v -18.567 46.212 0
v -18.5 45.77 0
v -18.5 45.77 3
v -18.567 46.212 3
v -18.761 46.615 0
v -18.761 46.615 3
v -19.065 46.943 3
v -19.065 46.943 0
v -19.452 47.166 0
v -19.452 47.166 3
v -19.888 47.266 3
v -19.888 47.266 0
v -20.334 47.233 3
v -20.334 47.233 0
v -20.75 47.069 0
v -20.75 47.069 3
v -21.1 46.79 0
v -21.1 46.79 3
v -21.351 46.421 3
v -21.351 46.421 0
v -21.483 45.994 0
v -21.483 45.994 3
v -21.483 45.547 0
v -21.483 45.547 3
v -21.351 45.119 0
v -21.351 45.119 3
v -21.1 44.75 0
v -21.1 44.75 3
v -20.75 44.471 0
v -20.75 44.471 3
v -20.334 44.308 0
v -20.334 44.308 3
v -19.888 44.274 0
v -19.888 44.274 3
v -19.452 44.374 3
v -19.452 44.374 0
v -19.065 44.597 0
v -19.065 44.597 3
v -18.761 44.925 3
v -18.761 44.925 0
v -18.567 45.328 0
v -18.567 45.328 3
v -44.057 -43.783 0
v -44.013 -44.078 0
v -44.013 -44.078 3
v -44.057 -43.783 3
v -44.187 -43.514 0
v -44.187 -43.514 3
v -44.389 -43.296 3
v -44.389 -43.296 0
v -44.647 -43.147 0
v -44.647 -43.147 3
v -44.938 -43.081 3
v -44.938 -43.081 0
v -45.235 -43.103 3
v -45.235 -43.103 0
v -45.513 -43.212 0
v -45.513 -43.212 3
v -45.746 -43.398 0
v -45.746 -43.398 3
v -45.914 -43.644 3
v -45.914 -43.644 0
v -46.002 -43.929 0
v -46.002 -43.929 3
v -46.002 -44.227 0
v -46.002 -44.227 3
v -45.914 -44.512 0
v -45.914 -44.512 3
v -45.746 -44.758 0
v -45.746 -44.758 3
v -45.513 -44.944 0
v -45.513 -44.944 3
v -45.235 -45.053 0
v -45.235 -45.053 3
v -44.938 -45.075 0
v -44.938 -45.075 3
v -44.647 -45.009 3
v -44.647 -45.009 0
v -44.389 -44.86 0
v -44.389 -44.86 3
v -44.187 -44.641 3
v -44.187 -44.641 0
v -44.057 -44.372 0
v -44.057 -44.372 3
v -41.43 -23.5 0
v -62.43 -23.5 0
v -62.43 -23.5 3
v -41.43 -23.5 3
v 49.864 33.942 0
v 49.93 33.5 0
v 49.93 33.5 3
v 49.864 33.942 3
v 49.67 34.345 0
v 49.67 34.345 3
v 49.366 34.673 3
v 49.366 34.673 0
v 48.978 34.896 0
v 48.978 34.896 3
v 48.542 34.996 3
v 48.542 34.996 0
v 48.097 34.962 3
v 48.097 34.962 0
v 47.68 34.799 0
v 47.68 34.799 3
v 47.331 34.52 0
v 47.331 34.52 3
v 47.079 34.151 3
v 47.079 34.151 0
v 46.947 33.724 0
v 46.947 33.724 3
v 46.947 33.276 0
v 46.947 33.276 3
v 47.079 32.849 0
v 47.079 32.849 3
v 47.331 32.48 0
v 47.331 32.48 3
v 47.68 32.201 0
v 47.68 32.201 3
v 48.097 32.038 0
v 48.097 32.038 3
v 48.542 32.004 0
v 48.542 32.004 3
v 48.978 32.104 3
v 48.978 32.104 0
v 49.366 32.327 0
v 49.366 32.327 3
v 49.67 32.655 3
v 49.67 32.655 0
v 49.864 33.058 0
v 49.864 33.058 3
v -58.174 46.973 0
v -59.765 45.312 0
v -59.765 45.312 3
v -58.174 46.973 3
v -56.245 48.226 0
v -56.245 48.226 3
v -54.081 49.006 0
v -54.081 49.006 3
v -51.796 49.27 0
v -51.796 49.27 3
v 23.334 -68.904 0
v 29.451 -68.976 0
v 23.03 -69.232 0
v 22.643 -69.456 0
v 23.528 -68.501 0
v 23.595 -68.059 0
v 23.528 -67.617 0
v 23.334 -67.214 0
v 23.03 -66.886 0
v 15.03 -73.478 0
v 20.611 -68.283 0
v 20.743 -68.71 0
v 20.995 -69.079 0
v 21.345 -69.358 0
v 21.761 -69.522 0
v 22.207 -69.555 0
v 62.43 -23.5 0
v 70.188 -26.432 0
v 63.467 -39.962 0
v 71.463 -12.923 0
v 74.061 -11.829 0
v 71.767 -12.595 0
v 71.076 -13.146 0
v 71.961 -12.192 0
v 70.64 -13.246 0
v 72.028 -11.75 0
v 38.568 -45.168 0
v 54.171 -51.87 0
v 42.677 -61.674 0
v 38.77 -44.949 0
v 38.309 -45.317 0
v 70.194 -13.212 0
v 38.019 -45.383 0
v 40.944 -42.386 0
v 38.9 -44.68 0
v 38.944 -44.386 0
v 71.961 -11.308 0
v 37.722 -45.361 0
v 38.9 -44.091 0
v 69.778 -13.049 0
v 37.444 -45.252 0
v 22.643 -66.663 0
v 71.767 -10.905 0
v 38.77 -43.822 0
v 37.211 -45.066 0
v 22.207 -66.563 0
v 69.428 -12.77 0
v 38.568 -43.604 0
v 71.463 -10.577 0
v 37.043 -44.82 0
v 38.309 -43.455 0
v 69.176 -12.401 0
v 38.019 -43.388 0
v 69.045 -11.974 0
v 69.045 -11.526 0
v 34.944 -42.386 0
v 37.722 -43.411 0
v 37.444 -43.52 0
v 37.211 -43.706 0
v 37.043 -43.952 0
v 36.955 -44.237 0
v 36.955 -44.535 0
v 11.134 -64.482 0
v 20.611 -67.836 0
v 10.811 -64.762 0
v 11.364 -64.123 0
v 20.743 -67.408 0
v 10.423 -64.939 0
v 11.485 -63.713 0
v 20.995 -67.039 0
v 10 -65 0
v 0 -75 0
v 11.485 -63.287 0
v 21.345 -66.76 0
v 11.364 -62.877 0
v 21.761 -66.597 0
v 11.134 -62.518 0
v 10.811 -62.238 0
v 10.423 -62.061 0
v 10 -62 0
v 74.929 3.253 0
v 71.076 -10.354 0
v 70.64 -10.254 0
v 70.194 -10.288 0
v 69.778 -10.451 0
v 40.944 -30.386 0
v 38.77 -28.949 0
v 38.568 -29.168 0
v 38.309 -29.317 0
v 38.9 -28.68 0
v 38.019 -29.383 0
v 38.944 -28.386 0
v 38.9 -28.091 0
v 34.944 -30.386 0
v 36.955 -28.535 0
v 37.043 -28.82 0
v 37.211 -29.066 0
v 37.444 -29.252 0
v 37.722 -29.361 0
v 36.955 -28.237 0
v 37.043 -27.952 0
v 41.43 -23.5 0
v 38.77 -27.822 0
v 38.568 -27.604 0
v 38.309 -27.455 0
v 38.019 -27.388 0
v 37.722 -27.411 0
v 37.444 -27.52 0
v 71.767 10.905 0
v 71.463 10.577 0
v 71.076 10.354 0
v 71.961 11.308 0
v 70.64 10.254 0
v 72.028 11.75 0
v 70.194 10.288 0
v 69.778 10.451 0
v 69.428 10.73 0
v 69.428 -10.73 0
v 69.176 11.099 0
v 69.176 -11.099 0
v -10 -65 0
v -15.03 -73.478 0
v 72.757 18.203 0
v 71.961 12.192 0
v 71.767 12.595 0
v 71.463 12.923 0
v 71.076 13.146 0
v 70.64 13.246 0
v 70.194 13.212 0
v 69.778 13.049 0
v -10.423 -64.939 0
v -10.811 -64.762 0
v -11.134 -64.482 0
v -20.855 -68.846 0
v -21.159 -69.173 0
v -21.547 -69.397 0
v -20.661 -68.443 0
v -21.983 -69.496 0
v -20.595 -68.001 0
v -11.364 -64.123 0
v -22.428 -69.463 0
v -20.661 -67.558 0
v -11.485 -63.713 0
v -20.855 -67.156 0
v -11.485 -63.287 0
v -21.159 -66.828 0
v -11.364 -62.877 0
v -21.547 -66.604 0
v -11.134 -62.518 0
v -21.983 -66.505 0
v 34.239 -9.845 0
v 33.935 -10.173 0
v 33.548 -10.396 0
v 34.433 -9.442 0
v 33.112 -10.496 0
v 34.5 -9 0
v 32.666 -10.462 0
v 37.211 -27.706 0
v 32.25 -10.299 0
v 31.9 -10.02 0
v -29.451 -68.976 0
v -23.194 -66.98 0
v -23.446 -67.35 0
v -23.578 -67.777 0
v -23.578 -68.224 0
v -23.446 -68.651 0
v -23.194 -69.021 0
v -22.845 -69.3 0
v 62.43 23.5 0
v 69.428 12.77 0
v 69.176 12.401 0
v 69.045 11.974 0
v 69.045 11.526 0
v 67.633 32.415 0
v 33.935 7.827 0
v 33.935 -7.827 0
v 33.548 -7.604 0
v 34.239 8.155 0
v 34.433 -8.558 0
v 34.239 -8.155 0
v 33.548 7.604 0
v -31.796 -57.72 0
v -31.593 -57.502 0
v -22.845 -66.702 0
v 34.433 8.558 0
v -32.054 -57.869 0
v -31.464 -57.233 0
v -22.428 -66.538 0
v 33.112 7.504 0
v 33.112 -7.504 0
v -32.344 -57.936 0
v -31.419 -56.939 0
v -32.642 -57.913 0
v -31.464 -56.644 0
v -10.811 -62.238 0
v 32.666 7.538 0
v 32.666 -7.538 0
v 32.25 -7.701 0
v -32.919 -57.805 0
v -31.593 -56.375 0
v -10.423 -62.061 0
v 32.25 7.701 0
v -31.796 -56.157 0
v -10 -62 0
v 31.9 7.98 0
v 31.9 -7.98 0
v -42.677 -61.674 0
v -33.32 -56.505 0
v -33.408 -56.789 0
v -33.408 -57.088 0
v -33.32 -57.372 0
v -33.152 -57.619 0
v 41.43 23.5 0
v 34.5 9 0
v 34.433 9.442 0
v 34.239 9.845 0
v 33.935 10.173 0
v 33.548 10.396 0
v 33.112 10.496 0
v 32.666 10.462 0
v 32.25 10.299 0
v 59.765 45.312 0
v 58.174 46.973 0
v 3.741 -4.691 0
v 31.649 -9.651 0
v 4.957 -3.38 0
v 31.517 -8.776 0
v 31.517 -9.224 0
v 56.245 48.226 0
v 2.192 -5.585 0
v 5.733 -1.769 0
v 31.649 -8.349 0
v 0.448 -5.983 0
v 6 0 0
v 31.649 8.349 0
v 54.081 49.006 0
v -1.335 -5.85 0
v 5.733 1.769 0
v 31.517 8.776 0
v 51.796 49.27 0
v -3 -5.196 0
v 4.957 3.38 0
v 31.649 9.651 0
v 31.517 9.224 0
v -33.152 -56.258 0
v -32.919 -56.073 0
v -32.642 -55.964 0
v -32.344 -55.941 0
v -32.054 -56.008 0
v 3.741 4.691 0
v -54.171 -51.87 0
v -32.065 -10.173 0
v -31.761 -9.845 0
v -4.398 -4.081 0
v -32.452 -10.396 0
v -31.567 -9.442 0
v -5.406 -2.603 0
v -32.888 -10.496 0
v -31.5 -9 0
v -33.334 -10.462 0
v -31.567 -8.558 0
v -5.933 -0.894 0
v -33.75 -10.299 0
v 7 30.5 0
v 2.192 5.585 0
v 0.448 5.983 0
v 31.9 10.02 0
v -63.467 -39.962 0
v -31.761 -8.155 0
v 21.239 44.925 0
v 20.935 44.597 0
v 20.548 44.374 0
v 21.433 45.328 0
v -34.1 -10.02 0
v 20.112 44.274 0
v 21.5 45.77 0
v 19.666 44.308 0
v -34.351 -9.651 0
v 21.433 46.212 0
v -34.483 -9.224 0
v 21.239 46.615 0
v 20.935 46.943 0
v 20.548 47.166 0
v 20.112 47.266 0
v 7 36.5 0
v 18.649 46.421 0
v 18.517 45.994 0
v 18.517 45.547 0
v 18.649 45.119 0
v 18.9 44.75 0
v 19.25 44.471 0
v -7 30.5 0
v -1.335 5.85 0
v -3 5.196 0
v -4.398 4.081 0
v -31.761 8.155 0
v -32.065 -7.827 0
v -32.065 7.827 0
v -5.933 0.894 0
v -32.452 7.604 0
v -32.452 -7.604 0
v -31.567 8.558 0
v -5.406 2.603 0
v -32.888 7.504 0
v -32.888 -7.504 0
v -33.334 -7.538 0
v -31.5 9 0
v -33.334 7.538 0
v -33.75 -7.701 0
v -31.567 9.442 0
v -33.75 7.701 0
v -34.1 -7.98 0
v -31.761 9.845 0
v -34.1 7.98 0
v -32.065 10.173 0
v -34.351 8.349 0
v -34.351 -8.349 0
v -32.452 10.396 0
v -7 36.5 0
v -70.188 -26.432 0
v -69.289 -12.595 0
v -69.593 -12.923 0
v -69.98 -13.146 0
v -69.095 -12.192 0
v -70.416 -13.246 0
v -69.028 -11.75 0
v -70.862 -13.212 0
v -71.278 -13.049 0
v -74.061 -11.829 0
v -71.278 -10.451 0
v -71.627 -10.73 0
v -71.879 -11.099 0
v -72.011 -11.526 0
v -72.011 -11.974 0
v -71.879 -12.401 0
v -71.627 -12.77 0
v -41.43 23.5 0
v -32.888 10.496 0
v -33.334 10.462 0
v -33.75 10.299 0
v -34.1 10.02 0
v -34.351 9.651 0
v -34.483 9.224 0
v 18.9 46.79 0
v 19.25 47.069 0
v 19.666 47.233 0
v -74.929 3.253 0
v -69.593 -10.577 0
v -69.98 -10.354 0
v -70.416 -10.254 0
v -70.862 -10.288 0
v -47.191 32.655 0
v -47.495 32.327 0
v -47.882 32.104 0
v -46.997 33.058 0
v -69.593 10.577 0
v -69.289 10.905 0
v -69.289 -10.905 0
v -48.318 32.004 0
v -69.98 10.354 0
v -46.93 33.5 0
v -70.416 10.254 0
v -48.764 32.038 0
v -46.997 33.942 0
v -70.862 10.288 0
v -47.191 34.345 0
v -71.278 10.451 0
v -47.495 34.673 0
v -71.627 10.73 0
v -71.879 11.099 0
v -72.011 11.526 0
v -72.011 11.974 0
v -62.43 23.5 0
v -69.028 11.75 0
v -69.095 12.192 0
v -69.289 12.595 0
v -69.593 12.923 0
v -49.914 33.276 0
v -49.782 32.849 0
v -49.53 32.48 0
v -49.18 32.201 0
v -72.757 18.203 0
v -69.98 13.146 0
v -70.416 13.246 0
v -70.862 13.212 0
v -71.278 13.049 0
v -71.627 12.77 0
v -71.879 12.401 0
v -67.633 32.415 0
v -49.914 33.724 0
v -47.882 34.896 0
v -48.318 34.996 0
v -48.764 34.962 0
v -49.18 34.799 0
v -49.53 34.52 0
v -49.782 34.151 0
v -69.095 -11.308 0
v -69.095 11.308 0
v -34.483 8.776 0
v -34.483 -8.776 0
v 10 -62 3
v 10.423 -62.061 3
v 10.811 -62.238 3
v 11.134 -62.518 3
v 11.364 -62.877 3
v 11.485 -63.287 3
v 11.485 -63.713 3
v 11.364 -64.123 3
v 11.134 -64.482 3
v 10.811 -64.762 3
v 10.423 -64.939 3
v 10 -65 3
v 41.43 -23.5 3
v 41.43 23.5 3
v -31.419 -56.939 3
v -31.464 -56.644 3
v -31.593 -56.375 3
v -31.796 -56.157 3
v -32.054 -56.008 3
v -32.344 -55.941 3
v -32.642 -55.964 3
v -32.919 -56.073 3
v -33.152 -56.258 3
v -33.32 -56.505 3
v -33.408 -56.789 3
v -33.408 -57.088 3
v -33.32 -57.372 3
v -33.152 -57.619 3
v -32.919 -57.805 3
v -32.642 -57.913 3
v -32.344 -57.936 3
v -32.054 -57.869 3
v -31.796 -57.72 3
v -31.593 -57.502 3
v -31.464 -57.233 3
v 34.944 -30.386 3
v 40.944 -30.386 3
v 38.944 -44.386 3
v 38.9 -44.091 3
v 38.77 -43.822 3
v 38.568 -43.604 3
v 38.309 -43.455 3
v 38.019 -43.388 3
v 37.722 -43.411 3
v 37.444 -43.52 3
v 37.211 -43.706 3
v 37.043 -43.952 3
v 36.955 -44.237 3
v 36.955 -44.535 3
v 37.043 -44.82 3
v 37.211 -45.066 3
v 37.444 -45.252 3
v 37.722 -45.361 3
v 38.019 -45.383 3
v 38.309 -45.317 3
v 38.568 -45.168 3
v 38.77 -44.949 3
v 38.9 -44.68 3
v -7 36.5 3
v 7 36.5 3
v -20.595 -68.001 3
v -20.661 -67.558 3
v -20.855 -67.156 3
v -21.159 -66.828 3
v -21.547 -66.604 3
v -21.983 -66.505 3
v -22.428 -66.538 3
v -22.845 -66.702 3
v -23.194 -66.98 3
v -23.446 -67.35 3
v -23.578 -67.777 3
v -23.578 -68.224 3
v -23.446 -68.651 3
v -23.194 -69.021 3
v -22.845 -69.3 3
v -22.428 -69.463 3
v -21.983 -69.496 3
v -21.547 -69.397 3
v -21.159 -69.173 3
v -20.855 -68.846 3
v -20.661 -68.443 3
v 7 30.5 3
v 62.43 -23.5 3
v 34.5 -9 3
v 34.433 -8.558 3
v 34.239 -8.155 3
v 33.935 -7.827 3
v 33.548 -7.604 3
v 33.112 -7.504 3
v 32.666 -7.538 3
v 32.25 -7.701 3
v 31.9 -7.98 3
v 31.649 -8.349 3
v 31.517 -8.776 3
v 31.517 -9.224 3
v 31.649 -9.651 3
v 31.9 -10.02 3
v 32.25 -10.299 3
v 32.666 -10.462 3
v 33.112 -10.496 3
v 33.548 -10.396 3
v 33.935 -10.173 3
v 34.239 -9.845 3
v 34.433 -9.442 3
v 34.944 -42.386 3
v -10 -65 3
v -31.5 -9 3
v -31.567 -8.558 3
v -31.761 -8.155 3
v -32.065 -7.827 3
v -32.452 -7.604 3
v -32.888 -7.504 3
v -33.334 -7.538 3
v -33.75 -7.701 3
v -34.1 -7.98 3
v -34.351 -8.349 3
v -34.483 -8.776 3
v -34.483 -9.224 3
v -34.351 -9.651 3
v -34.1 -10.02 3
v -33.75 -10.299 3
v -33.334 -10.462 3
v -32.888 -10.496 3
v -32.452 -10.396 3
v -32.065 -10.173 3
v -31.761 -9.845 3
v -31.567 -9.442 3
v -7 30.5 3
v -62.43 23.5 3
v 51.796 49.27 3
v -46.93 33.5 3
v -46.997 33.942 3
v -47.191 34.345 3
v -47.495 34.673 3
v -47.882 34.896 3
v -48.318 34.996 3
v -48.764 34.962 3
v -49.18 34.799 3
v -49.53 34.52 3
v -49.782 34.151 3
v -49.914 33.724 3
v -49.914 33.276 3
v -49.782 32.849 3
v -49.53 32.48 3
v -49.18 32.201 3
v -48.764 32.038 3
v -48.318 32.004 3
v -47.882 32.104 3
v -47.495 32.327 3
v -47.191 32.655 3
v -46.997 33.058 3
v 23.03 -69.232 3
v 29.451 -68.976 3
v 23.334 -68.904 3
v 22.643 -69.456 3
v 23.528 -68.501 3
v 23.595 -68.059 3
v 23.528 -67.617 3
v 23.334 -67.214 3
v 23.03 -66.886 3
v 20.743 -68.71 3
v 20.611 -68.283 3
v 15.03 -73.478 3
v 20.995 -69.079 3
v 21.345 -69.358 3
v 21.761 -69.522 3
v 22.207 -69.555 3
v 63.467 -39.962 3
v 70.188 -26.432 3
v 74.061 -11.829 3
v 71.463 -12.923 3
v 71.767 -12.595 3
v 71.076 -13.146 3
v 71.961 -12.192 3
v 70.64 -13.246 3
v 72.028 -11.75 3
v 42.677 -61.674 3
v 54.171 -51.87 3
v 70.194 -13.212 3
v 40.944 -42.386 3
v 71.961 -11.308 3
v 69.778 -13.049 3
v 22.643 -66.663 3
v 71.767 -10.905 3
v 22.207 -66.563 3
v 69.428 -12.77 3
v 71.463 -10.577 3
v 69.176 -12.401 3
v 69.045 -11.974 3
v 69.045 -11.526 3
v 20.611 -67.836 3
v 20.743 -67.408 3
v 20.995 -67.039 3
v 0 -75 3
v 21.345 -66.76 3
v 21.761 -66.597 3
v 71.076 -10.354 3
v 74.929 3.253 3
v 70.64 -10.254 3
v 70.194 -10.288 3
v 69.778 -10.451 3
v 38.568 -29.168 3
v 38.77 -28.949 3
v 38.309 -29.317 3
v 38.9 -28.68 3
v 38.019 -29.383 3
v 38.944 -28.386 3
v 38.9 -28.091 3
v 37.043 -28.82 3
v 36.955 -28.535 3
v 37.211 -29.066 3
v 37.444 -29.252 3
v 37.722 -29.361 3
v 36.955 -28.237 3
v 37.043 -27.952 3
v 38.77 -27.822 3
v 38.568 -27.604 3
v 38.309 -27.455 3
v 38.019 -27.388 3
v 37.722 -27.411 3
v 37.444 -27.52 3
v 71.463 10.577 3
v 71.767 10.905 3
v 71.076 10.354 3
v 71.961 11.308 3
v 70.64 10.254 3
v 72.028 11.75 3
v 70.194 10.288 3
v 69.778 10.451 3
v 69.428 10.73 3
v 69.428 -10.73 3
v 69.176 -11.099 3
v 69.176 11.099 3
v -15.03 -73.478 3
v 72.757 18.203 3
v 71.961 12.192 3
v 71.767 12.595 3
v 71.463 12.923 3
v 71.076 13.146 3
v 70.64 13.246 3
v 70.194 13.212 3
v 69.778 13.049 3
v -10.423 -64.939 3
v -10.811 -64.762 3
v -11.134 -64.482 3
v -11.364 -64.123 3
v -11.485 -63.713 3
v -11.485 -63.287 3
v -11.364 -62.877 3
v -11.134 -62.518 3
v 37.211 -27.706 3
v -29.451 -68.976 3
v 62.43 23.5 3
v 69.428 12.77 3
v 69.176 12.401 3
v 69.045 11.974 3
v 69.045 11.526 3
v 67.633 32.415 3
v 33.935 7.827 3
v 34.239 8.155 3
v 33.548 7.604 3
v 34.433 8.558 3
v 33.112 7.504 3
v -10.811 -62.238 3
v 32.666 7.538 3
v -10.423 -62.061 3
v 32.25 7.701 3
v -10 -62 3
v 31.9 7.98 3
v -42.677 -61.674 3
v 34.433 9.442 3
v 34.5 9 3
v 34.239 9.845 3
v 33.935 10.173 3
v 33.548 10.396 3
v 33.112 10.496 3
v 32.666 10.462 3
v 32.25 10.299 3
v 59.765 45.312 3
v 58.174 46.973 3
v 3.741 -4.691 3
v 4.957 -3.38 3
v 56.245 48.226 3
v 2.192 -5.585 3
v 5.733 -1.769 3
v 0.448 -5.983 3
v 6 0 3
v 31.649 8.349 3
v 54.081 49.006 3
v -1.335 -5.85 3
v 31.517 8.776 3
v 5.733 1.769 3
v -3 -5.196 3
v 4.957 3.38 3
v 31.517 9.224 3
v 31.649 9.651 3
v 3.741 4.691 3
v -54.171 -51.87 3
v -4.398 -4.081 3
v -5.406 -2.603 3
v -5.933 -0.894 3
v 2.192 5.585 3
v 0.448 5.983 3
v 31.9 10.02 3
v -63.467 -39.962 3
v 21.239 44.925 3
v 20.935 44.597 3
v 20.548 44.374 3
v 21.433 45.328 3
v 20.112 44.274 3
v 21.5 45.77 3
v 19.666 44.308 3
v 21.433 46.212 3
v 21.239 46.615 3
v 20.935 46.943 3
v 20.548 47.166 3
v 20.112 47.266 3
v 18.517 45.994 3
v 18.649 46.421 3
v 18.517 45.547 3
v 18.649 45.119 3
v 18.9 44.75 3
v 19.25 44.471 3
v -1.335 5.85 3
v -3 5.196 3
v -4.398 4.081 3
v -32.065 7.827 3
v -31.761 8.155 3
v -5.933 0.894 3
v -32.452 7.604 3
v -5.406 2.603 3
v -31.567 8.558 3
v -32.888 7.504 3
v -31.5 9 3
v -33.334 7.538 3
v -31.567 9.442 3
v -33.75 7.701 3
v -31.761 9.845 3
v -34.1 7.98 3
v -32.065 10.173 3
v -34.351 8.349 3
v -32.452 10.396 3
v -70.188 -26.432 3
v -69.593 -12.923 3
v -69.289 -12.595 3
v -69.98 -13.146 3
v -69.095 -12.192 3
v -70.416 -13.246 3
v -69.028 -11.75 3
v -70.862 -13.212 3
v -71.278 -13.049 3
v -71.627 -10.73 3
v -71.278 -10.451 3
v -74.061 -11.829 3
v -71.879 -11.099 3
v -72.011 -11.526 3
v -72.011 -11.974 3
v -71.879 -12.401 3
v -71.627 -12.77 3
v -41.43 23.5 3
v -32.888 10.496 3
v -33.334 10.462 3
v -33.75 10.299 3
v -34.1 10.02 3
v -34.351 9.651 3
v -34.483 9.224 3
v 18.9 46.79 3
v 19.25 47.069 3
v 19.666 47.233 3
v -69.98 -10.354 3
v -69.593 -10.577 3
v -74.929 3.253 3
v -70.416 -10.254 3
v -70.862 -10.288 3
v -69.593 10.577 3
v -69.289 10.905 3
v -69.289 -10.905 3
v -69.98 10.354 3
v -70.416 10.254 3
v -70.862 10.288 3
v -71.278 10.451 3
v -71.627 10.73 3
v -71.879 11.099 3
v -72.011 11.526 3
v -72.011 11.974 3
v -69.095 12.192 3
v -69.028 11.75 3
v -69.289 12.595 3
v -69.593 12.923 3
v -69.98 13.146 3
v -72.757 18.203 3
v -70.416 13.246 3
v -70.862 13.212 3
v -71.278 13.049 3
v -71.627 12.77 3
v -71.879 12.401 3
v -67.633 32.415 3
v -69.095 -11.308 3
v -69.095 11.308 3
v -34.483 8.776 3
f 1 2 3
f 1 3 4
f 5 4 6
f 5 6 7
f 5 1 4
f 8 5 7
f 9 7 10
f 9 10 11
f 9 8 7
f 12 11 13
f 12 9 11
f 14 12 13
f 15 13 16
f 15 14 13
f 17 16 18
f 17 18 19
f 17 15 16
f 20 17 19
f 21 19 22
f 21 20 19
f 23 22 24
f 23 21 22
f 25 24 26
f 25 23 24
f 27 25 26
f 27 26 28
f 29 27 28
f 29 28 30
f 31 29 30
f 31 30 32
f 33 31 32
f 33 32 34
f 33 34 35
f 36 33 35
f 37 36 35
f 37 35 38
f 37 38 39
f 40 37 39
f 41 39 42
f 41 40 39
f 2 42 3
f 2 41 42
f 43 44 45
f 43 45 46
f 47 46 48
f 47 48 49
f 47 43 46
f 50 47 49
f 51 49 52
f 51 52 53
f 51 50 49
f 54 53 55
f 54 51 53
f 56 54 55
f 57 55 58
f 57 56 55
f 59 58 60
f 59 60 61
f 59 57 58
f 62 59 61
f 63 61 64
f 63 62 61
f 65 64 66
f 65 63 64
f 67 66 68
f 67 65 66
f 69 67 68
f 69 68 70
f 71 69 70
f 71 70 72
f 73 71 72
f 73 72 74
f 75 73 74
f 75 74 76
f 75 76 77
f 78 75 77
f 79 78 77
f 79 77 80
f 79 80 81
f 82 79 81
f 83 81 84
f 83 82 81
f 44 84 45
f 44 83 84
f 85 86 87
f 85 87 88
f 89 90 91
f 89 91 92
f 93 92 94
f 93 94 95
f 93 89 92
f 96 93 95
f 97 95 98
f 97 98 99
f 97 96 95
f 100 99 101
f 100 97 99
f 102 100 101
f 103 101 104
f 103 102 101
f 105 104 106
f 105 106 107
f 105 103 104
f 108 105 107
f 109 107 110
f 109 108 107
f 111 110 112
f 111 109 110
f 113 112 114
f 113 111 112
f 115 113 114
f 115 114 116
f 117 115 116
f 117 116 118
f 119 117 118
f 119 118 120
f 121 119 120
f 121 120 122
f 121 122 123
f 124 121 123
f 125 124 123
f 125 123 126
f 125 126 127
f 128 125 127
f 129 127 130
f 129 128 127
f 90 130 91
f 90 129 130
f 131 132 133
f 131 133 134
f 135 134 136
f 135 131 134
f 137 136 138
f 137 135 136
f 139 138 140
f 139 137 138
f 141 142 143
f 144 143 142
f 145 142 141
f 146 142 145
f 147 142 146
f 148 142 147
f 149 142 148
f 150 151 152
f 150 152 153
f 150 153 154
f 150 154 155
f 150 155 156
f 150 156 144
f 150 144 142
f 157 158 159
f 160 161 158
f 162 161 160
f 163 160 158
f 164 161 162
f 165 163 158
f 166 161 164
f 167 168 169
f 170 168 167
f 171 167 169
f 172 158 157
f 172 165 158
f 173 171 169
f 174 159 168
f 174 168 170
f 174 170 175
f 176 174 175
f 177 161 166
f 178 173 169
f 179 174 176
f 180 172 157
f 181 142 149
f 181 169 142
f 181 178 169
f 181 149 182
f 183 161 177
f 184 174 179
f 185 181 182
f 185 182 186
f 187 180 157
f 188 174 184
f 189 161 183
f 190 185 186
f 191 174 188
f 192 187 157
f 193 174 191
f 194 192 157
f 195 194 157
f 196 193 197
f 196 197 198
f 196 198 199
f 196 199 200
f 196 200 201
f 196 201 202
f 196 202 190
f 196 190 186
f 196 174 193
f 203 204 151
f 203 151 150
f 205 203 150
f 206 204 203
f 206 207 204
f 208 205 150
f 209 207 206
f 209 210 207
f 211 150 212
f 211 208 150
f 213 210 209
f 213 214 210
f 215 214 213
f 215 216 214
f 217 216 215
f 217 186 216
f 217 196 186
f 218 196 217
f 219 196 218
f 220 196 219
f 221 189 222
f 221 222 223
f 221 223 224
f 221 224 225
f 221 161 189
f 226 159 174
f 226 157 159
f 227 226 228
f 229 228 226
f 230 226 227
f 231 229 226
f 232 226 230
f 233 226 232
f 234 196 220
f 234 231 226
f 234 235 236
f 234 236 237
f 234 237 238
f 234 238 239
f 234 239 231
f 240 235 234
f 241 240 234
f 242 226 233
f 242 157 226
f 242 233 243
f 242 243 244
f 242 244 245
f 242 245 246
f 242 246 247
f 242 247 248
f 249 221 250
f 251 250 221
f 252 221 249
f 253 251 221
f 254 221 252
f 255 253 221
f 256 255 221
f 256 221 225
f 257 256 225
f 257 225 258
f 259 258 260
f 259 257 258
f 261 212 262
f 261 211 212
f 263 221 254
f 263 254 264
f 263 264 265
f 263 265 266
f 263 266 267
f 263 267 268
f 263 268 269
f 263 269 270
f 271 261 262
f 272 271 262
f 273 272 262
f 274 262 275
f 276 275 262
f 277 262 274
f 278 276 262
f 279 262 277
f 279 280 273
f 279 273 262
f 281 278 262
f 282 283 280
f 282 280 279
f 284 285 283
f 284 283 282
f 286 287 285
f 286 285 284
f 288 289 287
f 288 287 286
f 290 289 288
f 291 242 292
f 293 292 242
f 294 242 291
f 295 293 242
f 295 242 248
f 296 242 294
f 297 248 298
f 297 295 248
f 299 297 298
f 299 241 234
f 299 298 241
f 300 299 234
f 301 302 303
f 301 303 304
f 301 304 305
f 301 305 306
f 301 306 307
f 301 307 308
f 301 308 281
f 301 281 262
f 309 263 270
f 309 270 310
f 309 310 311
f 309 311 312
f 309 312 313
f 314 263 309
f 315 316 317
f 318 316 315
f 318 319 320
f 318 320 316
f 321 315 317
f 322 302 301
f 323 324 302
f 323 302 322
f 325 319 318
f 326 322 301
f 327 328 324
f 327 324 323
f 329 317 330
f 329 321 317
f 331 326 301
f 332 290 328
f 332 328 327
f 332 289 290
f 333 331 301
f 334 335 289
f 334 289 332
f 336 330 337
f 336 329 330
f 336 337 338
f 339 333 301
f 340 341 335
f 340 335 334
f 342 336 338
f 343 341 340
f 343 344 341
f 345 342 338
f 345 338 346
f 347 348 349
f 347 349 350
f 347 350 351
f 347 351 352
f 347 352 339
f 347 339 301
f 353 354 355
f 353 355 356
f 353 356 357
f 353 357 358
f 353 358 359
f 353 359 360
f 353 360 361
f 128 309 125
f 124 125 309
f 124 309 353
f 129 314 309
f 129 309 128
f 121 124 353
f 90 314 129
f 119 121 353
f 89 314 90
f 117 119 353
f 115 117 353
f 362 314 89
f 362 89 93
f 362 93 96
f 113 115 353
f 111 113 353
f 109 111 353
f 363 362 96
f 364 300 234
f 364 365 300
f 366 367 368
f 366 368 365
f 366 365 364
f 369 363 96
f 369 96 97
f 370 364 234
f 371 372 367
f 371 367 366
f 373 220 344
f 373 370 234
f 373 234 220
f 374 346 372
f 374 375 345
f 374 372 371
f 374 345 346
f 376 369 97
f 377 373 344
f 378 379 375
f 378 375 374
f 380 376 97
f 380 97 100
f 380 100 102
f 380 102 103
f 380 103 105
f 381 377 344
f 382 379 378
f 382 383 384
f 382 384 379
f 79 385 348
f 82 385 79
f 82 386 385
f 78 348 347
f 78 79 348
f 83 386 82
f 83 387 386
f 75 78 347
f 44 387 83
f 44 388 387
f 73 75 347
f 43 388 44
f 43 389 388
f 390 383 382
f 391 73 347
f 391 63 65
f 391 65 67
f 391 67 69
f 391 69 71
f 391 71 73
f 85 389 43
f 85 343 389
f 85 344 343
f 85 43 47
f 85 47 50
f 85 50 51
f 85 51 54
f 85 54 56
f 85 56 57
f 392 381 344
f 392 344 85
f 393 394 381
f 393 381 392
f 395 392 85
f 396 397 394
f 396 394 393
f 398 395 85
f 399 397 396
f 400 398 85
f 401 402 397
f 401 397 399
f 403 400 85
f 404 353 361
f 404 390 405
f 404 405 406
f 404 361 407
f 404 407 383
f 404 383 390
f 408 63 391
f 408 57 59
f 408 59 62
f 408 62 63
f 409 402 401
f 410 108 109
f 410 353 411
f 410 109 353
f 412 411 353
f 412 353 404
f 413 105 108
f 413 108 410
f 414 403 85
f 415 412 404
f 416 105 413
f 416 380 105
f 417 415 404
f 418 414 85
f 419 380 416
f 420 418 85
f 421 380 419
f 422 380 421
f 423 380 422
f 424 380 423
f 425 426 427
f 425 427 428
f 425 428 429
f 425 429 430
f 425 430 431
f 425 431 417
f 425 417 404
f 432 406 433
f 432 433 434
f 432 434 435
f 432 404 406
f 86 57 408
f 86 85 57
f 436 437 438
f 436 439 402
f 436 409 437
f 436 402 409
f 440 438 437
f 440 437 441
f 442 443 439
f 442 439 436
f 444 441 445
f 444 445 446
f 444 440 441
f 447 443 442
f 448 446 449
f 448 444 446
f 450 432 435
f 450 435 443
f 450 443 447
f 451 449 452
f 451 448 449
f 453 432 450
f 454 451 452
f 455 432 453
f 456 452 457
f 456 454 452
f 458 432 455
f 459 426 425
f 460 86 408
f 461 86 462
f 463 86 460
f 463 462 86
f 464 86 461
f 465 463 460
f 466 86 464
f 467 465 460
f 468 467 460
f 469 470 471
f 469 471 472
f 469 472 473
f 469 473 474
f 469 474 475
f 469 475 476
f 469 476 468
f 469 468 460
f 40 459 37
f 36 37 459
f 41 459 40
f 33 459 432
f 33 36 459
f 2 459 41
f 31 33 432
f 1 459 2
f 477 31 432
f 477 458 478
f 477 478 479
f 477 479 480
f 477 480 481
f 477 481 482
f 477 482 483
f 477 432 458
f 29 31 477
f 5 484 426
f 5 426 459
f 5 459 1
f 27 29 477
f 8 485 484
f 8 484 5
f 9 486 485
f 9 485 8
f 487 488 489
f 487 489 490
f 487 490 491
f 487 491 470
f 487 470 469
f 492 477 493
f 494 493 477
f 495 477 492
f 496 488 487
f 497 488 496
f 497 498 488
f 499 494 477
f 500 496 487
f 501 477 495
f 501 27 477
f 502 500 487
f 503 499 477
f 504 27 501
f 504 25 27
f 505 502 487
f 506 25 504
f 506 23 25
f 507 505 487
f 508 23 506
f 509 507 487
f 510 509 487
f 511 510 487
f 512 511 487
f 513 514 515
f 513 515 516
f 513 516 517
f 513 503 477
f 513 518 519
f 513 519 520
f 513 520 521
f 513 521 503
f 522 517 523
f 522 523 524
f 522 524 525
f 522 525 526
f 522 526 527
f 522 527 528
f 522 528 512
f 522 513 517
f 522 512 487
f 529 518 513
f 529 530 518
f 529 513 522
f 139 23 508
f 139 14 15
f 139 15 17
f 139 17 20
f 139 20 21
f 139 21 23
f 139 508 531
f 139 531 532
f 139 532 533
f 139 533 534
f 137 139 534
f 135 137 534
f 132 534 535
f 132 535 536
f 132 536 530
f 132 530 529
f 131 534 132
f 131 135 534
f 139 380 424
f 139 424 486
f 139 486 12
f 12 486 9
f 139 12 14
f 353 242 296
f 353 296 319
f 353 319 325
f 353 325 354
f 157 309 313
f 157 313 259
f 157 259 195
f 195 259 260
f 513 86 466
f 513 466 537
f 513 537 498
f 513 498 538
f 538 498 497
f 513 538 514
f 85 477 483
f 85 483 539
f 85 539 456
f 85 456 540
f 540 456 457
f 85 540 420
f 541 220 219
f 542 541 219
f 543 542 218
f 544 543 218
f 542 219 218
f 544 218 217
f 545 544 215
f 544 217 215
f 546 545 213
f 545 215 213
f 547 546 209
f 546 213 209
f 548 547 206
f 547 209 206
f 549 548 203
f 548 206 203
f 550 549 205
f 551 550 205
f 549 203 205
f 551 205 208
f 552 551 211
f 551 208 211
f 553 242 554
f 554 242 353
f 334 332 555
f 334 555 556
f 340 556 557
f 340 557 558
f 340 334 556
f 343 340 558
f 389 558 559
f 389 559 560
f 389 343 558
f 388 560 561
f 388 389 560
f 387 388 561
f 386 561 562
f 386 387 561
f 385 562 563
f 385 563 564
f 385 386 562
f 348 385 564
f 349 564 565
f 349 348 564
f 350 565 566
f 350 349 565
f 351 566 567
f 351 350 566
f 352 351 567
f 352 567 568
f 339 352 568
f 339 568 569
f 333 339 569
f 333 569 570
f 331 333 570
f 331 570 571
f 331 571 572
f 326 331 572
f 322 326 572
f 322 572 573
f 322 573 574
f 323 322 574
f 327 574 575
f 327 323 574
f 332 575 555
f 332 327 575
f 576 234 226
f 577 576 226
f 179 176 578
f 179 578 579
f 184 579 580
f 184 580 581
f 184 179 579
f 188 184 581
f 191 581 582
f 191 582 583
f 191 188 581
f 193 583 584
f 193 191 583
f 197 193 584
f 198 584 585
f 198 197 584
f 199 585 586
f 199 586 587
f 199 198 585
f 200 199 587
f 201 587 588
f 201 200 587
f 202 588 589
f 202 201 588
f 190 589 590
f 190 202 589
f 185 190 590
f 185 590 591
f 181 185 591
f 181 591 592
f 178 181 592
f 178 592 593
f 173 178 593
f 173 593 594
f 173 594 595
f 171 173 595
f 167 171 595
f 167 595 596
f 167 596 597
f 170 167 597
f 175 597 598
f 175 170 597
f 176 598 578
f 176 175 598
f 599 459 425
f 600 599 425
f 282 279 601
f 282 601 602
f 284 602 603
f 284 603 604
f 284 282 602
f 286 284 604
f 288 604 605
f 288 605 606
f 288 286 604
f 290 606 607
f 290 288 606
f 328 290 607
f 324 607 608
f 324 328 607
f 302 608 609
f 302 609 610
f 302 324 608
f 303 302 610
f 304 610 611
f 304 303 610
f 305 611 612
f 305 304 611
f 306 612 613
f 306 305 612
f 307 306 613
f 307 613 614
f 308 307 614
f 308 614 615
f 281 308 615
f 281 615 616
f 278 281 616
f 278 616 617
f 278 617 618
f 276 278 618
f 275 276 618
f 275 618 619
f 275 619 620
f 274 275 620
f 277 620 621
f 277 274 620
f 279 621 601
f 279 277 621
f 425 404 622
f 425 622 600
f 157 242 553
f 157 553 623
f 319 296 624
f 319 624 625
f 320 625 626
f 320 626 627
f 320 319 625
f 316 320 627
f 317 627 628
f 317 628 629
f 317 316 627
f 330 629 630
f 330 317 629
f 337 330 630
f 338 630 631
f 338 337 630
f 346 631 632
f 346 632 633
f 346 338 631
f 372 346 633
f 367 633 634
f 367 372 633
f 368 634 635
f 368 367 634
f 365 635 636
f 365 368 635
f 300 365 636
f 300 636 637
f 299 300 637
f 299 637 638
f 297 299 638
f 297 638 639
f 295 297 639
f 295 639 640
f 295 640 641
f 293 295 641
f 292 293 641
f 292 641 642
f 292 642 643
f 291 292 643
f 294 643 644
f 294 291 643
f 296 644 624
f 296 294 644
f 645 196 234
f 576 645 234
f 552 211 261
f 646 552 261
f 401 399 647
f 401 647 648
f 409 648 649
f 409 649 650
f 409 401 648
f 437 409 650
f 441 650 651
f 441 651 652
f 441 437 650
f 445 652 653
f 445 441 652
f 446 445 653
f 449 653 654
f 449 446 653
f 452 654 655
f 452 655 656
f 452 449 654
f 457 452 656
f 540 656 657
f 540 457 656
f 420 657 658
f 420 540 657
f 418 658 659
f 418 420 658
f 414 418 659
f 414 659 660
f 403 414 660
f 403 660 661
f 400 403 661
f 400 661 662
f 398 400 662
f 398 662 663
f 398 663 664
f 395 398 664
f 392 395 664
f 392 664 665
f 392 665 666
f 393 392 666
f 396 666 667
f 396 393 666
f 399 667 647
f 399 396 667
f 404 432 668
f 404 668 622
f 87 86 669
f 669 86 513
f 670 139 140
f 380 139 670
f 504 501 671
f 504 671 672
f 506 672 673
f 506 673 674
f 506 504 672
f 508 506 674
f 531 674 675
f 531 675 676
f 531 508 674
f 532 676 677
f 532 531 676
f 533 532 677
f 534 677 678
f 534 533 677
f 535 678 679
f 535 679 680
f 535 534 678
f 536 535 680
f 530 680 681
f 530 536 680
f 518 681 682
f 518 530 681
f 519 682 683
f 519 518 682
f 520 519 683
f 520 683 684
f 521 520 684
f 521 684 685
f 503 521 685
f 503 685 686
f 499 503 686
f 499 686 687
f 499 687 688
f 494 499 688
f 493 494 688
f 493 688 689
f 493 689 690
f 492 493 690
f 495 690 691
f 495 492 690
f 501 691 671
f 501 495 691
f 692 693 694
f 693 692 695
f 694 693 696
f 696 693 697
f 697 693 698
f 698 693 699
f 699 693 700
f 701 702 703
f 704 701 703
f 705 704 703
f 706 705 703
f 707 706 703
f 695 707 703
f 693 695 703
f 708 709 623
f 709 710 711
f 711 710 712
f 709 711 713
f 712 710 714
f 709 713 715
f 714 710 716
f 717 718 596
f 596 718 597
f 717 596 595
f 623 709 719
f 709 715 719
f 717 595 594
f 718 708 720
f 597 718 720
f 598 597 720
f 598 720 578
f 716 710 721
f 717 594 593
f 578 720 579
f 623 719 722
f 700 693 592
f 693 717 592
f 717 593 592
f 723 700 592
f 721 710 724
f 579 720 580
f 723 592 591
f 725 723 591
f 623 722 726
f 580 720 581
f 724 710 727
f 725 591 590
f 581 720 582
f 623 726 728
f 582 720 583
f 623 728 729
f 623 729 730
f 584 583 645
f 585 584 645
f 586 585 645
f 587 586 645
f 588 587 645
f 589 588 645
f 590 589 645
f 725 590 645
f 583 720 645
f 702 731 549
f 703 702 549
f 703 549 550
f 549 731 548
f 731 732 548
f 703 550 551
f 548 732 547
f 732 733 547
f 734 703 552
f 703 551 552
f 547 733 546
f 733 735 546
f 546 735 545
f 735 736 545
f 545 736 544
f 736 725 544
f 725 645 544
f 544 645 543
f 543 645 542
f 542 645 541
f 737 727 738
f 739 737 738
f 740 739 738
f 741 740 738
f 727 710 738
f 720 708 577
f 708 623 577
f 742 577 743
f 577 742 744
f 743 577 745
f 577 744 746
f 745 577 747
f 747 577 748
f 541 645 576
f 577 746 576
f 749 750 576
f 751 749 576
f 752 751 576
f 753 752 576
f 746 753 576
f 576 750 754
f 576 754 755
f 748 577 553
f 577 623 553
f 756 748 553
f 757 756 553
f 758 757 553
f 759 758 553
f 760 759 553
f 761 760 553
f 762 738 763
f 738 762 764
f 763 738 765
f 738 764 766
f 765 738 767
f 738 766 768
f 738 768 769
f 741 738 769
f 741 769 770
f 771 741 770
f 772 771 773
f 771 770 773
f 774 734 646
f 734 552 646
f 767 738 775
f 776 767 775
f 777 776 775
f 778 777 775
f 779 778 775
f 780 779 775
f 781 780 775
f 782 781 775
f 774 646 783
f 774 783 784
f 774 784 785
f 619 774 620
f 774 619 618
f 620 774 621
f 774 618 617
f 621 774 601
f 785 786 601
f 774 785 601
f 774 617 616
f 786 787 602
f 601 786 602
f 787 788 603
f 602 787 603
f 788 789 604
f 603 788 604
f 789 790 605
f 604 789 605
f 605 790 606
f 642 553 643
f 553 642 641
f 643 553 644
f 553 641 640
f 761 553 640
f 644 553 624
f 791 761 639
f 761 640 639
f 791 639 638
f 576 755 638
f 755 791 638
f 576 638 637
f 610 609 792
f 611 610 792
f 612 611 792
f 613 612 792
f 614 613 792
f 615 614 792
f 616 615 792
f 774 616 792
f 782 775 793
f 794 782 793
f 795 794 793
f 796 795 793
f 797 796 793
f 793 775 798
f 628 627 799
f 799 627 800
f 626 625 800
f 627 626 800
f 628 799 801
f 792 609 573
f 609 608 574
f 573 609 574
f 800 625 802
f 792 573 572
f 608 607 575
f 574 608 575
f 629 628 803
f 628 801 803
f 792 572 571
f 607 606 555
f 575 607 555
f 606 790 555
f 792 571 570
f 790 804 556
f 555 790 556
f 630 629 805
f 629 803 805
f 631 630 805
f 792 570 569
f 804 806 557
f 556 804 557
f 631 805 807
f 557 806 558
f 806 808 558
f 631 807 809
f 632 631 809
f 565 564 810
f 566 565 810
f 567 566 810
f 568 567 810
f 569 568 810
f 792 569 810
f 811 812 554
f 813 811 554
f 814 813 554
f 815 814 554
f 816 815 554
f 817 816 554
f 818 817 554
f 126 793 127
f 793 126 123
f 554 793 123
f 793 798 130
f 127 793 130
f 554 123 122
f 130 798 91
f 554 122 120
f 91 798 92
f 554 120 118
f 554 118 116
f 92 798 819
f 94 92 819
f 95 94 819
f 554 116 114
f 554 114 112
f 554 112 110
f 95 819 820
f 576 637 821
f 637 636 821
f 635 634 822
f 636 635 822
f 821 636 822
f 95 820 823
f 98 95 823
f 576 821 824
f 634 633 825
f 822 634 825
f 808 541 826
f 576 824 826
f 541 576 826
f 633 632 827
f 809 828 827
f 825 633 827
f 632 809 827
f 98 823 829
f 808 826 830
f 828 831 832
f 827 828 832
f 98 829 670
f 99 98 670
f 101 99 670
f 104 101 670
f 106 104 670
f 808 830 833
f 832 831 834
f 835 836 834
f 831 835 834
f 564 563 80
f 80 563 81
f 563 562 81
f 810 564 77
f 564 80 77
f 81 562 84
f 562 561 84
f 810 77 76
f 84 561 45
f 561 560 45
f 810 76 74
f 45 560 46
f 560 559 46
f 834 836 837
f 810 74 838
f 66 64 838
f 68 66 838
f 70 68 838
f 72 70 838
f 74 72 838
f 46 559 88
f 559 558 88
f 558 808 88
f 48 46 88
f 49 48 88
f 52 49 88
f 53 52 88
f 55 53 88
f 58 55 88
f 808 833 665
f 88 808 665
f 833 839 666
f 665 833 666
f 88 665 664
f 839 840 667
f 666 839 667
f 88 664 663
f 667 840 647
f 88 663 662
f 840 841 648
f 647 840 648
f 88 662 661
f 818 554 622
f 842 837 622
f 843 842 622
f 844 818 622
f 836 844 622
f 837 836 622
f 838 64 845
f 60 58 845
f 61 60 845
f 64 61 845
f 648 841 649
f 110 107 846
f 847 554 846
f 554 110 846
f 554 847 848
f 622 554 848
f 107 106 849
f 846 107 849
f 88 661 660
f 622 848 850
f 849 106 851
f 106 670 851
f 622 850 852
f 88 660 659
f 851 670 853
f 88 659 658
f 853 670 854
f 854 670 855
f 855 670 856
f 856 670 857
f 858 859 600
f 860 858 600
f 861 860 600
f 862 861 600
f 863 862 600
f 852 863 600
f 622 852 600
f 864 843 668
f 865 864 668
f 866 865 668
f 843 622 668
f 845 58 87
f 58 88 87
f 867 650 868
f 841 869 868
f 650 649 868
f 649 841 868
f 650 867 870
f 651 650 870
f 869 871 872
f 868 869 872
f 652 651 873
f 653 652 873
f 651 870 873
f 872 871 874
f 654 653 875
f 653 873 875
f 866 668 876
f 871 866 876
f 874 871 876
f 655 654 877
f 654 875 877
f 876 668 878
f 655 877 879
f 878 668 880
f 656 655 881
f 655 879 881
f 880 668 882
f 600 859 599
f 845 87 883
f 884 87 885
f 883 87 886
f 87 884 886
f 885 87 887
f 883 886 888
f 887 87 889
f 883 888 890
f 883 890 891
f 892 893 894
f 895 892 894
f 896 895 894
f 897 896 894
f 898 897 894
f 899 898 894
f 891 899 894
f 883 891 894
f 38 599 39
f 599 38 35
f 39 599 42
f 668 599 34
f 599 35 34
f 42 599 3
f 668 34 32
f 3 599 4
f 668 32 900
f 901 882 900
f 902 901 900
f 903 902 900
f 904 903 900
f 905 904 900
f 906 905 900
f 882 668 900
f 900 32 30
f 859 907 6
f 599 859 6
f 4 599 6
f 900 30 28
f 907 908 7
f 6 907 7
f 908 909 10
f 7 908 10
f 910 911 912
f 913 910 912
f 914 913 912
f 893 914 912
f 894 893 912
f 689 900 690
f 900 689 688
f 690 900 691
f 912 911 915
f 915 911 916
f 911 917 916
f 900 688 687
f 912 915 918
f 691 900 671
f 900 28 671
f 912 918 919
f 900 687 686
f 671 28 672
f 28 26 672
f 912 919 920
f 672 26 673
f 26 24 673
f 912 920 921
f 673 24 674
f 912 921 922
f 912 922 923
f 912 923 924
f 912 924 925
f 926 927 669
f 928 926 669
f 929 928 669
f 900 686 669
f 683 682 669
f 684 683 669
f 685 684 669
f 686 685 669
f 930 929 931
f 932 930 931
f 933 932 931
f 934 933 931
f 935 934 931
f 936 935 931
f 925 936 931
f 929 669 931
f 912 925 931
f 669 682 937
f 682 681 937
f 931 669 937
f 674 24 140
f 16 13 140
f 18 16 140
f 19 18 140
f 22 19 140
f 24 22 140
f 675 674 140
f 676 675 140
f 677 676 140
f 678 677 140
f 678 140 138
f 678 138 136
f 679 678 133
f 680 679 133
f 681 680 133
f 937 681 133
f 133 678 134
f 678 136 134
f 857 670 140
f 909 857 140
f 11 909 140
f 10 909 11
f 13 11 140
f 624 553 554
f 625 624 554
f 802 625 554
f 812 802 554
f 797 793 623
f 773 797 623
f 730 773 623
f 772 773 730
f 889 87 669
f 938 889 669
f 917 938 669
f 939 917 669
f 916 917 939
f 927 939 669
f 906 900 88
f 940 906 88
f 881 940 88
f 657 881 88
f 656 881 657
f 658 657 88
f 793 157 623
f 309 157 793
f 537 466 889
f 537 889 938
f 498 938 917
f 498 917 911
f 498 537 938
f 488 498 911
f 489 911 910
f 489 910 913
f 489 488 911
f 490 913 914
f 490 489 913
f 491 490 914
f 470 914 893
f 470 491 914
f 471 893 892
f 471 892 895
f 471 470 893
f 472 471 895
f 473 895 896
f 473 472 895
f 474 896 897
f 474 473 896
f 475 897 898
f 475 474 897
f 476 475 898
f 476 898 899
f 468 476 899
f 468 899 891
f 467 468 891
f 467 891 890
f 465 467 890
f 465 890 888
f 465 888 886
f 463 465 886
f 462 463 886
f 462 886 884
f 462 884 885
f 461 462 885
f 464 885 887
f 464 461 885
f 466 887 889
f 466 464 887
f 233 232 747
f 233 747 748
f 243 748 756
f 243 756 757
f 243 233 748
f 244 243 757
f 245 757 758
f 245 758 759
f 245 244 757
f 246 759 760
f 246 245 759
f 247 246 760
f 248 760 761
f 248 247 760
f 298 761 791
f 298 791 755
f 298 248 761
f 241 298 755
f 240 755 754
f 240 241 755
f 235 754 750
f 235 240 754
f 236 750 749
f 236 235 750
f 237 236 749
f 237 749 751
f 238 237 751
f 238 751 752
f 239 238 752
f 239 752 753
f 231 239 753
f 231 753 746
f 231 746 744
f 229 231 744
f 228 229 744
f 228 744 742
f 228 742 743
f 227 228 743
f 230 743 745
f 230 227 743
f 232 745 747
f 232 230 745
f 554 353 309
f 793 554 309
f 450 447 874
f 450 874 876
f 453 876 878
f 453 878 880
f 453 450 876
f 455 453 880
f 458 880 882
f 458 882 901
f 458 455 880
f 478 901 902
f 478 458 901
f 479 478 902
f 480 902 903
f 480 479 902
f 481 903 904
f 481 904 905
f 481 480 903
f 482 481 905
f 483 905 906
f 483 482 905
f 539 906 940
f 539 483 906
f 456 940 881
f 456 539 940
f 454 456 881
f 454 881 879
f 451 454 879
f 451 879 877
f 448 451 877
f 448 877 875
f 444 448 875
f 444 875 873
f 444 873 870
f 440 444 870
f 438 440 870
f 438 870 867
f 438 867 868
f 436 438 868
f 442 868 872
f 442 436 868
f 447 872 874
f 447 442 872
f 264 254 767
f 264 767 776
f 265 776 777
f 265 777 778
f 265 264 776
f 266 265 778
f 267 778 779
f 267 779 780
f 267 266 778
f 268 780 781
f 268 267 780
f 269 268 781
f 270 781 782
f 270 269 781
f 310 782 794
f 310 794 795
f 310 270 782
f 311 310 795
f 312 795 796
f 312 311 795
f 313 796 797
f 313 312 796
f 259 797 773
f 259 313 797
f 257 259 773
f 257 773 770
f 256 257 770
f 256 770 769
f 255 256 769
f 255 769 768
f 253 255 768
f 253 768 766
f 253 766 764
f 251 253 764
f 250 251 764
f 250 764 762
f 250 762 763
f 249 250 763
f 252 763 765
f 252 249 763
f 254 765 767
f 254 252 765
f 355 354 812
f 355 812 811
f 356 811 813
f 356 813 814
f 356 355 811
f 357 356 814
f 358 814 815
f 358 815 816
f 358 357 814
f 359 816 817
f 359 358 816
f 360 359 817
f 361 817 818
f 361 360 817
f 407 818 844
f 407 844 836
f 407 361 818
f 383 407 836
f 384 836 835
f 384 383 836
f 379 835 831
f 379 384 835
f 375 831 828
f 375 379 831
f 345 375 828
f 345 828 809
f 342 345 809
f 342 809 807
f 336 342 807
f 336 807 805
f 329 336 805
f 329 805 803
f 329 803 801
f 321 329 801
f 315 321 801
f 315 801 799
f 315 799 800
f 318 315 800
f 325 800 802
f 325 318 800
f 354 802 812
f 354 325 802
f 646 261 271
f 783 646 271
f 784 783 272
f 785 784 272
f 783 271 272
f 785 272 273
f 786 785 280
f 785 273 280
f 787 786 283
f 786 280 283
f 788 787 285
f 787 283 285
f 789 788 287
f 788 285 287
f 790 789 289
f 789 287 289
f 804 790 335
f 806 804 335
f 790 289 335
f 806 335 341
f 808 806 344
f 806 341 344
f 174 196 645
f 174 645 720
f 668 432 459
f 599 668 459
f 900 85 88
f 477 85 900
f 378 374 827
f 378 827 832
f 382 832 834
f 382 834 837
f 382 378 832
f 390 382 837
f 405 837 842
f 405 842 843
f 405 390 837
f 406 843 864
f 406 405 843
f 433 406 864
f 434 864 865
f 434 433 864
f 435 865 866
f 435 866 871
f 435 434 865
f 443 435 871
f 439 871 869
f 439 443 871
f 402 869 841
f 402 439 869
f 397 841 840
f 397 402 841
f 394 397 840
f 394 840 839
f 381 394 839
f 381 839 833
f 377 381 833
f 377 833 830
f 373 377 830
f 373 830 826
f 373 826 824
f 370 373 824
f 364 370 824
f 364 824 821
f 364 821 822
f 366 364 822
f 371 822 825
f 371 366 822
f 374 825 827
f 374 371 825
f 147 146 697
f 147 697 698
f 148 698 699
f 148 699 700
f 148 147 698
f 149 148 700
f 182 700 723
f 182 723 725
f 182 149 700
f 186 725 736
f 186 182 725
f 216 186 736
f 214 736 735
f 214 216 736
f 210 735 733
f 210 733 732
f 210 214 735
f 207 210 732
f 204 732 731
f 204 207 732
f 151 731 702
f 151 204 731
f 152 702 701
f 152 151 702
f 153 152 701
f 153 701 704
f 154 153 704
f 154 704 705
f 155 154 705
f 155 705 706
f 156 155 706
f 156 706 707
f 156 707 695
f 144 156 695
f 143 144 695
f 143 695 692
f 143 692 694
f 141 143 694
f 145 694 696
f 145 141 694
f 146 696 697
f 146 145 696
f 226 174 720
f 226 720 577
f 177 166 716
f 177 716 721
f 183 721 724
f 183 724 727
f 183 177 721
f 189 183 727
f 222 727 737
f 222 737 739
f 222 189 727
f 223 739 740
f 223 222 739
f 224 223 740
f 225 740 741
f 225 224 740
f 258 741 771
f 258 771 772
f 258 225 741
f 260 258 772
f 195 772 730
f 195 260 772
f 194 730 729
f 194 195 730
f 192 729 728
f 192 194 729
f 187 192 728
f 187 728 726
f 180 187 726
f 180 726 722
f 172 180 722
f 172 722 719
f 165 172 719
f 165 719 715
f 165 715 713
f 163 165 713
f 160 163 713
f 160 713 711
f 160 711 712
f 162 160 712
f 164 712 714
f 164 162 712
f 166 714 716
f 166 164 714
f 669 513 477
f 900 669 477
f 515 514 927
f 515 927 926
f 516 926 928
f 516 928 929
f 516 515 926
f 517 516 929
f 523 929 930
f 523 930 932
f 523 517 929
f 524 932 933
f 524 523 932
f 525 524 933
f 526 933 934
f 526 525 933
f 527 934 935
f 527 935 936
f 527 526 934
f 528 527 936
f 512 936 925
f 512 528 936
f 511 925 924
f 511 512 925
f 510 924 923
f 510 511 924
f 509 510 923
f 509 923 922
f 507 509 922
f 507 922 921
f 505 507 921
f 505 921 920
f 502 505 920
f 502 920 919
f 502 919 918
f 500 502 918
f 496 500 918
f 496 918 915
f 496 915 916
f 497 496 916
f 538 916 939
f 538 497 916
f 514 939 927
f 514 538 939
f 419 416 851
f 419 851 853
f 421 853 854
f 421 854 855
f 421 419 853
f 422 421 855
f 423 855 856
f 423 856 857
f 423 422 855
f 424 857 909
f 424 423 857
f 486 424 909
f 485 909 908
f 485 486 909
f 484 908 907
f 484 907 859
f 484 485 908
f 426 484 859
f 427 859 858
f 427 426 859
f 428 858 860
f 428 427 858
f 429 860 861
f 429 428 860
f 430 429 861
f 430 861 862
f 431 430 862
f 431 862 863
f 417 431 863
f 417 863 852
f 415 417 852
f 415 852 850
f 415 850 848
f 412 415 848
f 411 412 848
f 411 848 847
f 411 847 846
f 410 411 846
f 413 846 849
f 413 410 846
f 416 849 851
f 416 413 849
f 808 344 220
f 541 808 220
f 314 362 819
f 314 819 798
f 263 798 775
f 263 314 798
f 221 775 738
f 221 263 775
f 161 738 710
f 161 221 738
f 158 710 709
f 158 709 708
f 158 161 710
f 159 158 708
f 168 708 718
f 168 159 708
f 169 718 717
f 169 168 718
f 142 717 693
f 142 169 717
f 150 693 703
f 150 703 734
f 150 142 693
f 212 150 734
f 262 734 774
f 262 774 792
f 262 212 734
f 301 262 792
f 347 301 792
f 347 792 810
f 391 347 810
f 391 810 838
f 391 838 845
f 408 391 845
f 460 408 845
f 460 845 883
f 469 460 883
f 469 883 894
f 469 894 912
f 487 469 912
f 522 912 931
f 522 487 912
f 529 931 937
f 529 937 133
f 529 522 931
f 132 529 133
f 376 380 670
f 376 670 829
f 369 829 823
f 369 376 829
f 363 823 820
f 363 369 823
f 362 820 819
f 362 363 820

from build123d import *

# Parameters (mm, degrees)
SKETCH1_R           = 1.5
SKETCH1_R_2         = 6
SKETCH1_R_3         = 1
SKETCH1_W           = 21
SKETCH1_H           = 47
SKETCH1_W_2         = 6
SKETCH1_H_2         = 12
SKETCH1_W_3         = 14
SKETCH1_H_3         = 6
BOSS_EXTRUDE2_DEPTH = 3


with BuildPart() as part:
    # Sketch1 → Boss-Extrude2 (new body)
    with BuildSketch(Plane.XY):
        with BuildLine():
            Line((-51.796300436, 49.270131922), (51.796300436, 49.270131922))
            ThreePointArc((51.796300436, 49.270131922), (56.24514368, 48.226012325), (59.764962041, 45.311690679))
            ThreePointArc((59.764962041, 45.311690679), (0, -75), (-59.764962041, 45.311690679))
            ThreePointArc((-59.764962041, 45.311690679), (-56.24514368, 48.226012325), (-51.796300436, 49.270131922))
        make_face()
        with Locations((22.094715098, -68.059231897)):
            Circle(SKETCH1_R, mode=Mode.SUBTRACT)
        with Locations((-22.094715098, -68.000540915)):
            Circle(SKETCH1_R, mode=Mode.SUBTRACT)
        Circle(SKETCH1_R_2, mode=Mode.SUBTRACT)
        with Locations((-33, 9)):
            Circle(SKETCH1_R, mode=Mode.SUBTRACT)
        with Locations((-33, -9)):
            Circle(SKETCH1_R, mode=Mode.SUBTRACT)
        with Locations((48.430328075, 33.5)):
            Circle(SKETCH1_R, mode=Mode.SUBTRACT)
        with Locations((20, 45.770131922)):
            Circle(SKETCH1_R, mode=Mode.SUBTRACT)
        with Locations((-20, 45.770131922)):
            Circle(SKETCH1_R, mode=Mode.SUBTRACT)
        with Locations((-48.430328075, 33.5)):
            Circle(SKETCH1_R, mode=Mode.SUBTRACT)
        with Locations((-32.419192278, -56.938528011)):
            Circle(SKETCH1_R_3, mode=Mode.SUBTRACT)
        with Locations((-45.012826675, -44.077720389)):
            Circle(SKETCH1_R_3, mode=Mode.SUBTRACT)
        with Locations((37.944032627, -28.385695159)):
            Circle(SKETCH1_R_3, mode=Mode.SUBTRACT)
        with Locations((37.944032627, -44.385695159)):
            Circle(SKETCH1_R_3, mode=Mode.SUBTRACT)
        with Locations((-70.527920003, 11.75)):
            Circle(SKETCH1_R, mode=Mode.SUBTRACT)
        with Locations((-70.527920003, -11.75)):
            Circle(SKETCH1_R, mode=Mode.SUBTRACT)
        with Locations((70.527920003, -11.75)):
            Circle(SKETCH1_R, mode=Mode.SUBTRACT)
        with Locations((70.527920003, 11.75)):
            Circle(SKETCH1_R, mode=Mode.SUBTRACT)
        with Locations((33, -9)):
            Circle(SKETCH1_R, mode=Mode.SUBTRACT)
        with Locations((33, 9)):
            Circle(SKETCH1_R, mode=Mode.SUBTRACT)
        with Locations((-51.930328075, 0)):
            Rectangle(SKETCH1_W, SKETCH1_H, mode=Mode.SUBTRACT)
        with BuildLine():
            Line((-10, -62), (10, -62))
            ThreePointArc((10, -62), (11.5, -63.5), (10, -65))
            Line((10, -65), (-10, -65))
            ThreePointArc((-10, -65), (-11.5, -63.5), (-10, -62))
        make_face(mode=Mode.SUBTRACT)
        with Locations((37.944032627, -36.385695159)):
            Rectangle(SKETCH1_W_2, SKETCH1_H_2, mode=Mode.SUBTRACT)
        with Locations((51.930328075, 0)):
            Rectangle(SKETCH1_W, SKETCH1_H, mode=Mode.SUBTRACT)
        with Locations((0, 33.5)):
            Rectangle(SKETCH1_W_3, SKETCH1_H_3, mode=Mode.SUBTRACT)
    extrude(amount=BOSS_EXTRUDE2_DEPTH)


solid = part.part
